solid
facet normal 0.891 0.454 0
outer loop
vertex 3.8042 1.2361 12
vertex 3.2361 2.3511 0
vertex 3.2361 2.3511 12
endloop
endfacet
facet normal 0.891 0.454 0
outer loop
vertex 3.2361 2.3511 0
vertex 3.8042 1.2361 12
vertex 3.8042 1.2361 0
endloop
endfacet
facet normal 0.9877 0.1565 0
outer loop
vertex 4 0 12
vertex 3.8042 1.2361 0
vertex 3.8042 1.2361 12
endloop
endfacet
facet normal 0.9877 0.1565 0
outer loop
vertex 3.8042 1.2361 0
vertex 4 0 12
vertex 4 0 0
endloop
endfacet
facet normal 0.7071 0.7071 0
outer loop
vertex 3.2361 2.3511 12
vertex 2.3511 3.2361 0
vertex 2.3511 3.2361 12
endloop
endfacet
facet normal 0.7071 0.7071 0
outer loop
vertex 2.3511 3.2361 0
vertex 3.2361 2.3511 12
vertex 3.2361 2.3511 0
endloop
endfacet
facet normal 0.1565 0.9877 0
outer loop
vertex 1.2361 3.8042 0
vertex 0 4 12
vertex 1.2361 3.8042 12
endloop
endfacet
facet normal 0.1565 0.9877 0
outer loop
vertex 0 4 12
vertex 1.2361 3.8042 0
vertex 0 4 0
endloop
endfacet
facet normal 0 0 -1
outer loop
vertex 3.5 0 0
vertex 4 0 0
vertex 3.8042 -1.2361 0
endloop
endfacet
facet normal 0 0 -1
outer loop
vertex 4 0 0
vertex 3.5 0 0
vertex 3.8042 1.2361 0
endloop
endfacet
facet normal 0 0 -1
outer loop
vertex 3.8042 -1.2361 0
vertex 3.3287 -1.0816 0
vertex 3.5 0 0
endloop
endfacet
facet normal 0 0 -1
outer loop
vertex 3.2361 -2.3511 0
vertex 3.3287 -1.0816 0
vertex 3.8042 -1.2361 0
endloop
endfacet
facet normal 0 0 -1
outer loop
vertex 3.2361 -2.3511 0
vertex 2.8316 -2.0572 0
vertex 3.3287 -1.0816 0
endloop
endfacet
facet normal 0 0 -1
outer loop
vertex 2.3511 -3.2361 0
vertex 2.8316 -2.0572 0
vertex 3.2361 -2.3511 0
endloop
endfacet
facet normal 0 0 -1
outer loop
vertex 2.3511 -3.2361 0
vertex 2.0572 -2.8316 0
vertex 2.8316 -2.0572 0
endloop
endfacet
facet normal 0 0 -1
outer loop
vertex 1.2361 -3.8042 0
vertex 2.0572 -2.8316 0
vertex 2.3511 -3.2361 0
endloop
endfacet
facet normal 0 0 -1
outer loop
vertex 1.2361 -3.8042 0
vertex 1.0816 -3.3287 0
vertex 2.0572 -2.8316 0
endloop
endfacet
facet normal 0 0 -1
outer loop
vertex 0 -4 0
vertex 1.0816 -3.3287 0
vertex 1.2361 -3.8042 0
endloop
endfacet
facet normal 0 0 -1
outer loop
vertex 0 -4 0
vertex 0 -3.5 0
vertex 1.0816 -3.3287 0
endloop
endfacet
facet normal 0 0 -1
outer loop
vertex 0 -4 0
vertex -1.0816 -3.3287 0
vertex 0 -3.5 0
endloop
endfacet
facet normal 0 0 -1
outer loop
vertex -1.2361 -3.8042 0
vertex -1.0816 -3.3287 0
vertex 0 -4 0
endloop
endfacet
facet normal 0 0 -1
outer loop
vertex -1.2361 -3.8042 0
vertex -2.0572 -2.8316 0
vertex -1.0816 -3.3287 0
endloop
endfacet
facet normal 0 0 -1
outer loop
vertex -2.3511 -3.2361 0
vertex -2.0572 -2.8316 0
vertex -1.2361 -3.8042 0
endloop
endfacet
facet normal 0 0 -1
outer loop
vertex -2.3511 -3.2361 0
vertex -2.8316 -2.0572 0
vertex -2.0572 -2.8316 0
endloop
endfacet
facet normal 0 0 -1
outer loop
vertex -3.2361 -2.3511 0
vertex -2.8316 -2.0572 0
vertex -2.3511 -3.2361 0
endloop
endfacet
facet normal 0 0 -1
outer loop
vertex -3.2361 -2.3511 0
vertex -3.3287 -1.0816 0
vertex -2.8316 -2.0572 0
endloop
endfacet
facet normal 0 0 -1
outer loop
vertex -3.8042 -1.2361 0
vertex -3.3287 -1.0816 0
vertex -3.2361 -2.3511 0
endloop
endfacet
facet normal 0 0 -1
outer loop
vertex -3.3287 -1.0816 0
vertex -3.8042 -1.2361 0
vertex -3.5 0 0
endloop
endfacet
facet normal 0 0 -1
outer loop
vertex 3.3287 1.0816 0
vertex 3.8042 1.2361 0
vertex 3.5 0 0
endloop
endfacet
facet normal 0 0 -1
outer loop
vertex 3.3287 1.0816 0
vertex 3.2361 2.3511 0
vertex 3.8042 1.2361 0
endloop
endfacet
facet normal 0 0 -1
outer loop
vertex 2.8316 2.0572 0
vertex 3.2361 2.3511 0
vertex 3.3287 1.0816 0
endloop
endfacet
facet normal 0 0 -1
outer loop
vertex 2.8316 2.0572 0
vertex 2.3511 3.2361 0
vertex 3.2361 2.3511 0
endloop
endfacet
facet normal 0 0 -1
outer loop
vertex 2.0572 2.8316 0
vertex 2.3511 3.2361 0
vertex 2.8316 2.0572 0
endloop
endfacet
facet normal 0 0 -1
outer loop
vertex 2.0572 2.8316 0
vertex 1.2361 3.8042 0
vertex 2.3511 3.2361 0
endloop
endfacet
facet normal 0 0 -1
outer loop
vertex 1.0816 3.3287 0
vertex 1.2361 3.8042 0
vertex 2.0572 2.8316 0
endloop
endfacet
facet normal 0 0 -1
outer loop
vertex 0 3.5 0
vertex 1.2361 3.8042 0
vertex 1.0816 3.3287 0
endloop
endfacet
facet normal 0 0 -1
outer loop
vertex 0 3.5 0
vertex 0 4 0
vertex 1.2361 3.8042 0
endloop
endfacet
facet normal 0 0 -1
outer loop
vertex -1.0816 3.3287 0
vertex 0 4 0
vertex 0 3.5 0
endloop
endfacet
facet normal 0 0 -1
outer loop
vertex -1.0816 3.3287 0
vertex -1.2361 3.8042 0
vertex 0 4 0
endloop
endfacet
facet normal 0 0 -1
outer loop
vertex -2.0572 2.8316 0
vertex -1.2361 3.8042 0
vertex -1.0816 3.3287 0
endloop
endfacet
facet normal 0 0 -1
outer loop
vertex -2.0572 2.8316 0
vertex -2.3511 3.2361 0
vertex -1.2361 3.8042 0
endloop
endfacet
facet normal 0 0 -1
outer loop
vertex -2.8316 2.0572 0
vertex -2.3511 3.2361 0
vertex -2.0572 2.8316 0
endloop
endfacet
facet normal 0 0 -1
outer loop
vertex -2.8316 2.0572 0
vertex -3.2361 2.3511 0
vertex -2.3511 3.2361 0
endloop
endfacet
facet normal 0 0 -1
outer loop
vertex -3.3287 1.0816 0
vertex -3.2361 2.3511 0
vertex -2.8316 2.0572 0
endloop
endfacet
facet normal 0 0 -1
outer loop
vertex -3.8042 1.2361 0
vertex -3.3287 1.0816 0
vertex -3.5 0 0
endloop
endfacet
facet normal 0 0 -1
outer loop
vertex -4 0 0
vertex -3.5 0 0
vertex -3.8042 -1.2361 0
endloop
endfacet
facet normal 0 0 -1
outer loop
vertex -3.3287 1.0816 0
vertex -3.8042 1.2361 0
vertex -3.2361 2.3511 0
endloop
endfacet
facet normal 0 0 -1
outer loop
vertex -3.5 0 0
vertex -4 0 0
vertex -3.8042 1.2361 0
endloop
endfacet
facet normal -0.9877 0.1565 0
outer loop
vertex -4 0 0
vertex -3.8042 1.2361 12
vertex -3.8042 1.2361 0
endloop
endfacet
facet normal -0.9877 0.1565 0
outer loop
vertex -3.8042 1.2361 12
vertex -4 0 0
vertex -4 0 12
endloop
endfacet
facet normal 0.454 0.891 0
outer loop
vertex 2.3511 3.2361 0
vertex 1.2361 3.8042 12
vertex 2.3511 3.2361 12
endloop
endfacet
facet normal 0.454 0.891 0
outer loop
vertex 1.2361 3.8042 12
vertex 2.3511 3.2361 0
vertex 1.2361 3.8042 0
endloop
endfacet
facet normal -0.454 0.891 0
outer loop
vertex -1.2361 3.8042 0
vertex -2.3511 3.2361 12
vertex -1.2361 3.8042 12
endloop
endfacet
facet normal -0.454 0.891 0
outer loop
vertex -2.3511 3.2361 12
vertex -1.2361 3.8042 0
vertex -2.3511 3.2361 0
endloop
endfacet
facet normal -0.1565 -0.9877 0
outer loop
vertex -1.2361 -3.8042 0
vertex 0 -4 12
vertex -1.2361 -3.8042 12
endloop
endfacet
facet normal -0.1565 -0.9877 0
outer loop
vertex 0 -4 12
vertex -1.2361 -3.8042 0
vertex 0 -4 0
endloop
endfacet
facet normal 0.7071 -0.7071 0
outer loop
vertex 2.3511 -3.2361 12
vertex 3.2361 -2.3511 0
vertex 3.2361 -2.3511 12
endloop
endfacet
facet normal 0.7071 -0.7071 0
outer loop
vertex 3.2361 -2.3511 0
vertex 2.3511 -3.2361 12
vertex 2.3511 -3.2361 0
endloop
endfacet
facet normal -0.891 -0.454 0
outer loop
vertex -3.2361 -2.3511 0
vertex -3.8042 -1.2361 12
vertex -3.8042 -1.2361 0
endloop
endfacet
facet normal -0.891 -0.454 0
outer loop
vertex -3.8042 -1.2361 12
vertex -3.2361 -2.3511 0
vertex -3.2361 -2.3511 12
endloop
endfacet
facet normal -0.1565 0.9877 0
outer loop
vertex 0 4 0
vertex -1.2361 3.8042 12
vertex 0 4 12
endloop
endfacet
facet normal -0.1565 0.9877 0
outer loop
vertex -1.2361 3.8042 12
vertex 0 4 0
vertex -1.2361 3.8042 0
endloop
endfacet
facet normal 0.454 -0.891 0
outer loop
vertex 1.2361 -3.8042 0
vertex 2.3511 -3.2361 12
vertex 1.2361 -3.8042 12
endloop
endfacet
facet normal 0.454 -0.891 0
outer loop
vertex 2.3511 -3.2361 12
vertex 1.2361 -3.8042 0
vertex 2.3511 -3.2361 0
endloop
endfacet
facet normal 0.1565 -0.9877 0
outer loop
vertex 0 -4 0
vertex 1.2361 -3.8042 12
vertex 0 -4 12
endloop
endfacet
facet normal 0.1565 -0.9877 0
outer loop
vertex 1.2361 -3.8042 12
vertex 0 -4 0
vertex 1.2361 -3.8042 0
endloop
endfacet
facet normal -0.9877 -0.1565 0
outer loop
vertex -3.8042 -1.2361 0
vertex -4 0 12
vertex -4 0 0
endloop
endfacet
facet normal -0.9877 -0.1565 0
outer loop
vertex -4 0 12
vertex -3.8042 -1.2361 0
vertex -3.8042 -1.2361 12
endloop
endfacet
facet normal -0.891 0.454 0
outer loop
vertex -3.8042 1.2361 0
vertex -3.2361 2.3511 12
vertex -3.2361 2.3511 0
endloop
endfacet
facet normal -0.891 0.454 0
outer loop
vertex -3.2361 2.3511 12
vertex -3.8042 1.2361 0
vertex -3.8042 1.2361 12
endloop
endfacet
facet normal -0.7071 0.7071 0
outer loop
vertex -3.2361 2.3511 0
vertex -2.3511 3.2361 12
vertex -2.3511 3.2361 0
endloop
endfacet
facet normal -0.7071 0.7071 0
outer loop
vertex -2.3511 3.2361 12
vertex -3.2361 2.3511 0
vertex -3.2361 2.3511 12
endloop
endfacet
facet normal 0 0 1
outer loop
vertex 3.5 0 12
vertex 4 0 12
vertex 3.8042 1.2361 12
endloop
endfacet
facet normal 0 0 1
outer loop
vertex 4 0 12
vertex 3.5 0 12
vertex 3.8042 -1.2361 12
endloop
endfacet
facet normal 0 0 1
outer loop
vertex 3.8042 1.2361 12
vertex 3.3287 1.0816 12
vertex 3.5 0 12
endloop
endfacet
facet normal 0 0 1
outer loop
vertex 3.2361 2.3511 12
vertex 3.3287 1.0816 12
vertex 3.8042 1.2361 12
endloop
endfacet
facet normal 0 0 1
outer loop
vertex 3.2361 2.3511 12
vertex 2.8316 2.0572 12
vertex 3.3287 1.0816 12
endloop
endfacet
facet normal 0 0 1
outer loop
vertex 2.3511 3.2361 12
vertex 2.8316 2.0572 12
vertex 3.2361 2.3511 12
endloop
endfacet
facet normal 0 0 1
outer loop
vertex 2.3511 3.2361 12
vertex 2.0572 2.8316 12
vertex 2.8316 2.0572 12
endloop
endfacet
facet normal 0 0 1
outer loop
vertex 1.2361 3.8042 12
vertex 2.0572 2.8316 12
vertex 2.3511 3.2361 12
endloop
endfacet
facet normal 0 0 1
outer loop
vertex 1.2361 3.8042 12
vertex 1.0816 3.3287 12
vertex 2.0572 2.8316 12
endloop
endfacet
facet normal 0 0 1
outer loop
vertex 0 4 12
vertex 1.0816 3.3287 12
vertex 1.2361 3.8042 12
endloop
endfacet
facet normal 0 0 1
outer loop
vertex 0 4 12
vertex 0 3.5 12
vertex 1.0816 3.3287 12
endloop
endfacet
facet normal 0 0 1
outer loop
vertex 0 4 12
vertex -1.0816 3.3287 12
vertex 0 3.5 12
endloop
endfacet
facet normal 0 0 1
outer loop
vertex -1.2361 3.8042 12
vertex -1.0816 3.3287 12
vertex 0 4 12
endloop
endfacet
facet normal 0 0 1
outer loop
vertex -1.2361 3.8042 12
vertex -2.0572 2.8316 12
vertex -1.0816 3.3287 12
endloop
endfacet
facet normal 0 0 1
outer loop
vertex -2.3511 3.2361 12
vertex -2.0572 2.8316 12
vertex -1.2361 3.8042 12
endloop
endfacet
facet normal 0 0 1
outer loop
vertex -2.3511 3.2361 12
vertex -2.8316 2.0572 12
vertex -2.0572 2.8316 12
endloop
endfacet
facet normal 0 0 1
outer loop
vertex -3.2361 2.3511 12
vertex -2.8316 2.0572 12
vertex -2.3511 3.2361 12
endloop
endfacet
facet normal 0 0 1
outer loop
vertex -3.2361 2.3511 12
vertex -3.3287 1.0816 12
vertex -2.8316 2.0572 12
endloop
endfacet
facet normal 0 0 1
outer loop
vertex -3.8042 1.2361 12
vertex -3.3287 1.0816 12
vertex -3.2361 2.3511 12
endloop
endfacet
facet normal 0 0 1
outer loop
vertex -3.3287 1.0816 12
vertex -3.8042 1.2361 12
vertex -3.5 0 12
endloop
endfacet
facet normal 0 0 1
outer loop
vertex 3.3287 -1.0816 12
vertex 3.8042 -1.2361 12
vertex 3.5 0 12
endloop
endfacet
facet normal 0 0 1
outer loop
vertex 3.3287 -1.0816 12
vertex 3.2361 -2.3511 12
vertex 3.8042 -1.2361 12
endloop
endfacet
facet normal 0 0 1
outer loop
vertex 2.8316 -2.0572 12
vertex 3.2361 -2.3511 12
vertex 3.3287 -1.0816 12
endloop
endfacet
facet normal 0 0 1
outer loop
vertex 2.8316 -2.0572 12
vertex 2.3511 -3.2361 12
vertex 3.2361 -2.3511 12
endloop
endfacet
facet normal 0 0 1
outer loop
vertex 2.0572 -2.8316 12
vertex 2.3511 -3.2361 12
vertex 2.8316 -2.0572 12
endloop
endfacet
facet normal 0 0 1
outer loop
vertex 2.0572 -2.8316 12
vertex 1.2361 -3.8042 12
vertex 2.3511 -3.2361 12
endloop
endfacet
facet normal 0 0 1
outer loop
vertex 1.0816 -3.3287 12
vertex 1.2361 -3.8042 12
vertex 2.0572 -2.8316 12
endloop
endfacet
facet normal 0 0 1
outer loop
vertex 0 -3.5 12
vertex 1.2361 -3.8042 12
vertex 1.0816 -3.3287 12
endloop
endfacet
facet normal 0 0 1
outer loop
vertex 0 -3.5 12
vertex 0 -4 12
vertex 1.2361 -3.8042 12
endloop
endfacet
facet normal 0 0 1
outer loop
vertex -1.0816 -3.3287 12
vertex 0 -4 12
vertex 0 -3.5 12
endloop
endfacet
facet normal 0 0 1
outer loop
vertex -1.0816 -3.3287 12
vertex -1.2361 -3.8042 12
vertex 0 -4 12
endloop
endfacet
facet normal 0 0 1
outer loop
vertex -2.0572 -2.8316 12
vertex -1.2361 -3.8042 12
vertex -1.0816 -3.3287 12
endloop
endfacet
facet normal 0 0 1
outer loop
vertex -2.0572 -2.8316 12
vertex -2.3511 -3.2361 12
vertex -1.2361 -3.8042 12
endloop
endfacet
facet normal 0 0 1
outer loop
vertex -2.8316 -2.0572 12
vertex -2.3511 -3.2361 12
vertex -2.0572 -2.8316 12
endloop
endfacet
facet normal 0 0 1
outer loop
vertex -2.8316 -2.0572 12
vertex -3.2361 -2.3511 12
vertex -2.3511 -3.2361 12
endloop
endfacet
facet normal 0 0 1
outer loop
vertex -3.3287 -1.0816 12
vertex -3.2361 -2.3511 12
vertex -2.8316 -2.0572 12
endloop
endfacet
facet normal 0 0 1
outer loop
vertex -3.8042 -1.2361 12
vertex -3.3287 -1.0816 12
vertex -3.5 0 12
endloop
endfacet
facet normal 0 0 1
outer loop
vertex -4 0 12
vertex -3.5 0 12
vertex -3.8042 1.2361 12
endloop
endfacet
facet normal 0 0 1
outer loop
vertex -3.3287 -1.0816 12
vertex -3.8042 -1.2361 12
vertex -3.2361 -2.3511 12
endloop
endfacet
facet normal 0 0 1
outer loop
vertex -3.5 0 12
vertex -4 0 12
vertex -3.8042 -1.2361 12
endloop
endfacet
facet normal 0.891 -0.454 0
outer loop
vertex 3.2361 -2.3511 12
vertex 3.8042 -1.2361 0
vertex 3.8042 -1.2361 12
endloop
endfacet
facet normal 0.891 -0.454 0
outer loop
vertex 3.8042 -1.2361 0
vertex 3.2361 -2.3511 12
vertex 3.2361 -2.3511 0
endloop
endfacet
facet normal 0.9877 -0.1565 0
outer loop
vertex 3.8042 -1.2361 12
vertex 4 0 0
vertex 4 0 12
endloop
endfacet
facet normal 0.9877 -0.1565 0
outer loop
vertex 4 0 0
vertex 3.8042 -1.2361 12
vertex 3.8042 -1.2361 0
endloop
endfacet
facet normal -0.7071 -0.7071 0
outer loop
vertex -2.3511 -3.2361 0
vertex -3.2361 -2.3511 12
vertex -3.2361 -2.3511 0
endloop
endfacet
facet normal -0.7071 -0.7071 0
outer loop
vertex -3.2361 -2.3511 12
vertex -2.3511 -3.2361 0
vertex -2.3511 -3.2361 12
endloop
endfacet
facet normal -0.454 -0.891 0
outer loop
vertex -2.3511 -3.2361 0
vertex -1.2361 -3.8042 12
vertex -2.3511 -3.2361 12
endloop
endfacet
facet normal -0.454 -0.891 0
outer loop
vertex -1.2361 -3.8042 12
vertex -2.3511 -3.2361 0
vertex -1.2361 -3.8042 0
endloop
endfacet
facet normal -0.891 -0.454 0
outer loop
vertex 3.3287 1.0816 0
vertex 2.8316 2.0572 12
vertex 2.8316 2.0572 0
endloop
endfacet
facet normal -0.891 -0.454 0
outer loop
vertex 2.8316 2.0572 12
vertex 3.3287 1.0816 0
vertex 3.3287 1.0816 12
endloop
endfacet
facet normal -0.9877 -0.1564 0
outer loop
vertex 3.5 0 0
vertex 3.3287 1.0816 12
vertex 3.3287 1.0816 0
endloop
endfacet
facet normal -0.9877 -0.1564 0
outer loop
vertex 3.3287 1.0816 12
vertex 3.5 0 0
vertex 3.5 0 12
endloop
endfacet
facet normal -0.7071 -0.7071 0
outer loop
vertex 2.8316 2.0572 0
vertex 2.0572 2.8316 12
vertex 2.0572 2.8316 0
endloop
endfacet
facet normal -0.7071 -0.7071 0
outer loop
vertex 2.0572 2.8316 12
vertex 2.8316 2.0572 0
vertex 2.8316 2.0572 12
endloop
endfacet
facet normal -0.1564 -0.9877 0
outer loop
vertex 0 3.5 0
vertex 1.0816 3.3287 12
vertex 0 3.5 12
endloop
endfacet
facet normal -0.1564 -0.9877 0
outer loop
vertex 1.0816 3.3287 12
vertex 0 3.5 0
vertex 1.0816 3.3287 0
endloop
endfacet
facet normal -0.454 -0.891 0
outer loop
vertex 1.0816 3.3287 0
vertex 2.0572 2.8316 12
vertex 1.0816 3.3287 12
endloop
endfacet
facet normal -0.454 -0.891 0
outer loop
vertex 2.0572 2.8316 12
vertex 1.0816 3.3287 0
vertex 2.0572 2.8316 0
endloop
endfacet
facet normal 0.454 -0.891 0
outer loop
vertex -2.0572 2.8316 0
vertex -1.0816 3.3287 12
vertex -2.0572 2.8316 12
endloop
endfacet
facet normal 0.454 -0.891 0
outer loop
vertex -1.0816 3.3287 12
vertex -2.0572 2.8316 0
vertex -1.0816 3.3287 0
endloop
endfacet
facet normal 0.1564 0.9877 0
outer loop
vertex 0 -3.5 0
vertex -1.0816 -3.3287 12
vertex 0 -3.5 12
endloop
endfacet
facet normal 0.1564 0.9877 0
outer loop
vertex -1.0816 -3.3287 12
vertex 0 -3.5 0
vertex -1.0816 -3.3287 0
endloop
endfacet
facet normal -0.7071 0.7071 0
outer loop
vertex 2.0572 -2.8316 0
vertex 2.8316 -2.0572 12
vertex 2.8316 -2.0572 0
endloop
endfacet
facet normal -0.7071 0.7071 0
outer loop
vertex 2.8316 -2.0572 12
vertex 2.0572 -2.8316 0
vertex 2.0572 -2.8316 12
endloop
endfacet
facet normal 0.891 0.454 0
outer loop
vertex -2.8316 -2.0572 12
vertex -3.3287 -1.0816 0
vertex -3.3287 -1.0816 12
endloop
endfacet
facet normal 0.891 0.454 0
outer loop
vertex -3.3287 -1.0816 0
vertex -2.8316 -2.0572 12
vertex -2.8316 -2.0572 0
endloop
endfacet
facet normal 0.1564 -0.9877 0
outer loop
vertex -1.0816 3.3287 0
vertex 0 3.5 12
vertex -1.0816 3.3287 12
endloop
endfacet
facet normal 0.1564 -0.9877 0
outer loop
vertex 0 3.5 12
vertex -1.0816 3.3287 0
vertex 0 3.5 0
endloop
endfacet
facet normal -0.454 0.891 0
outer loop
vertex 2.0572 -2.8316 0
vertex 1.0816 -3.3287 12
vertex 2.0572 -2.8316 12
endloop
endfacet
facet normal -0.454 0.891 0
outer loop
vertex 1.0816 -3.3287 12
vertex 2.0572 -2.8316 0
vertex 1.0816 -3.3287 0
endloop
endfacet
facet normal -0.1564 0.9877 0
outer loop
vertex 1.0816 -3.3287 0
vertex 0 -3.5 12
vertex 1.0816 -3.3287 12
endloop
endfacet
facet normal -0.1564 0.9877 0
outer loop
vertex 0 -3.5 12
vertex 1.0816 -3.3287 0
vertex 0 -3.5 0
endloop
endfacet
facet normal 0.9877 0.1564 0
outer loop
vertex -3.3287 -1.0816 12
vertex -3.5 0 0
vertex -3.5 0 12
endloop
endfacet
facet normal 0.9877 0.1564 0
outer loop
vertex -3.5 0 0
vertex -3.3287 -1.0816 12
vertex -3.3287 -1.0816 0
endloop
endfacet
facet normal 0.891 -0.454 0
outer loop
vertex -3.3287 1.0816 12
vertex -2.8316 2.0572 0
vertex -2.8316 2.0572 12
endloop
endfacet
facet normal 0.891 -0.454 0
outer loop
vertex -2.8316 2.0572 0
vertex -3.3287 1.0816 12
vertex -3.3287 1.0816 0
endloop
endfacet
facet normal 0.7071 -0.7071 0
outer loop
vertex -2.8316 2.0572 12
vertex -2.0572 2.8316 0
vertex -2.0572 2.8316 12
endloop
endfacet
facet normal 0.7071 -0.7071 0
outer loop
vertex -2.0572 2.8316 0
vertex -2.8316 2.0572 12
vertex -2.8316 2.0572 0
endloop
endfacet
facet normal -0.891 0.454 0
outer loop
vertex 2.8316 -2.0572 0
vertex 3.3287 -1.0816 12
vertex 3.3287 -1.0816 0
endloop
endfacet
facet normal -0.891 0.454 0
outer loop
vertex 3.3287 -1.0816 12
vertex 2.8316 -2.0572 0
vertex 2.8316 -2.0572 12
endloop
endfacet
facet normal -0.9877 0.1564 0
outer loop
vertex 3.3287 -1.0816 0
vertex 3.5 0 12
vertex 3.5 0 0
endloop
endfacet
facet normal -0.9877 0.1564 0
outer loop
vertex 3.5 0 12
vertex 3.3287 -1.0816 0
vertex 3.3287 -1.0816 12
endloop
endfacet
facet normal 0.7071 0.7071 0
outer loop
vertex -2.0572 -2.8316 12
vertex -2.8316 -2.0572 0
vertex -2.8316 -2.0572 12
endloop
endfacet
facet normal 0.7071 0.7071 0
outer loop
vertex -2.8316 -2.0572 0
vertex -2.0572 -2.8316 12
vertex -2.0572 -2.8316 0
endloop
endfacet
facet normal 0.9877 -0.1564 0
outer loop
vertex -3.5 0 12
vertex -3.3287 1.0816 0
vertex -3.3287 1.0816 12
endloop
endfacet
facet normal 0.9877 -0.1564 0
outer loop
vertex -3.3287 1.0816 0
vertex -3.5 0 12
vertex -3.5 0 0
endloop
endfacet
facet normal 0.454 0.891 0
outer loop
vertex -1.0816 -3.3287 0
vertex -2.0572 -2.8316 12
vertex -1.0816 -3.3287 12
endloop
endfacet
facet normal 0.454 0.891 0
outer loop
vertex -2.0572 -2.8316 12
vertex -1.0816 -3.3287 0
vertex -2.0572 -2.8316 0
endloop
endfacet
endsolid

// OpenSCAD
// Eduardo Blanco Bielsa - UO285176
module spacer(h, d, fn){
    difference(){
      cylinder (h = h, d=d, $fn=fn);
      cylinder (h = h, d=d-1, $fn=fn);
    }
}

spacer(12, 8, 20);
